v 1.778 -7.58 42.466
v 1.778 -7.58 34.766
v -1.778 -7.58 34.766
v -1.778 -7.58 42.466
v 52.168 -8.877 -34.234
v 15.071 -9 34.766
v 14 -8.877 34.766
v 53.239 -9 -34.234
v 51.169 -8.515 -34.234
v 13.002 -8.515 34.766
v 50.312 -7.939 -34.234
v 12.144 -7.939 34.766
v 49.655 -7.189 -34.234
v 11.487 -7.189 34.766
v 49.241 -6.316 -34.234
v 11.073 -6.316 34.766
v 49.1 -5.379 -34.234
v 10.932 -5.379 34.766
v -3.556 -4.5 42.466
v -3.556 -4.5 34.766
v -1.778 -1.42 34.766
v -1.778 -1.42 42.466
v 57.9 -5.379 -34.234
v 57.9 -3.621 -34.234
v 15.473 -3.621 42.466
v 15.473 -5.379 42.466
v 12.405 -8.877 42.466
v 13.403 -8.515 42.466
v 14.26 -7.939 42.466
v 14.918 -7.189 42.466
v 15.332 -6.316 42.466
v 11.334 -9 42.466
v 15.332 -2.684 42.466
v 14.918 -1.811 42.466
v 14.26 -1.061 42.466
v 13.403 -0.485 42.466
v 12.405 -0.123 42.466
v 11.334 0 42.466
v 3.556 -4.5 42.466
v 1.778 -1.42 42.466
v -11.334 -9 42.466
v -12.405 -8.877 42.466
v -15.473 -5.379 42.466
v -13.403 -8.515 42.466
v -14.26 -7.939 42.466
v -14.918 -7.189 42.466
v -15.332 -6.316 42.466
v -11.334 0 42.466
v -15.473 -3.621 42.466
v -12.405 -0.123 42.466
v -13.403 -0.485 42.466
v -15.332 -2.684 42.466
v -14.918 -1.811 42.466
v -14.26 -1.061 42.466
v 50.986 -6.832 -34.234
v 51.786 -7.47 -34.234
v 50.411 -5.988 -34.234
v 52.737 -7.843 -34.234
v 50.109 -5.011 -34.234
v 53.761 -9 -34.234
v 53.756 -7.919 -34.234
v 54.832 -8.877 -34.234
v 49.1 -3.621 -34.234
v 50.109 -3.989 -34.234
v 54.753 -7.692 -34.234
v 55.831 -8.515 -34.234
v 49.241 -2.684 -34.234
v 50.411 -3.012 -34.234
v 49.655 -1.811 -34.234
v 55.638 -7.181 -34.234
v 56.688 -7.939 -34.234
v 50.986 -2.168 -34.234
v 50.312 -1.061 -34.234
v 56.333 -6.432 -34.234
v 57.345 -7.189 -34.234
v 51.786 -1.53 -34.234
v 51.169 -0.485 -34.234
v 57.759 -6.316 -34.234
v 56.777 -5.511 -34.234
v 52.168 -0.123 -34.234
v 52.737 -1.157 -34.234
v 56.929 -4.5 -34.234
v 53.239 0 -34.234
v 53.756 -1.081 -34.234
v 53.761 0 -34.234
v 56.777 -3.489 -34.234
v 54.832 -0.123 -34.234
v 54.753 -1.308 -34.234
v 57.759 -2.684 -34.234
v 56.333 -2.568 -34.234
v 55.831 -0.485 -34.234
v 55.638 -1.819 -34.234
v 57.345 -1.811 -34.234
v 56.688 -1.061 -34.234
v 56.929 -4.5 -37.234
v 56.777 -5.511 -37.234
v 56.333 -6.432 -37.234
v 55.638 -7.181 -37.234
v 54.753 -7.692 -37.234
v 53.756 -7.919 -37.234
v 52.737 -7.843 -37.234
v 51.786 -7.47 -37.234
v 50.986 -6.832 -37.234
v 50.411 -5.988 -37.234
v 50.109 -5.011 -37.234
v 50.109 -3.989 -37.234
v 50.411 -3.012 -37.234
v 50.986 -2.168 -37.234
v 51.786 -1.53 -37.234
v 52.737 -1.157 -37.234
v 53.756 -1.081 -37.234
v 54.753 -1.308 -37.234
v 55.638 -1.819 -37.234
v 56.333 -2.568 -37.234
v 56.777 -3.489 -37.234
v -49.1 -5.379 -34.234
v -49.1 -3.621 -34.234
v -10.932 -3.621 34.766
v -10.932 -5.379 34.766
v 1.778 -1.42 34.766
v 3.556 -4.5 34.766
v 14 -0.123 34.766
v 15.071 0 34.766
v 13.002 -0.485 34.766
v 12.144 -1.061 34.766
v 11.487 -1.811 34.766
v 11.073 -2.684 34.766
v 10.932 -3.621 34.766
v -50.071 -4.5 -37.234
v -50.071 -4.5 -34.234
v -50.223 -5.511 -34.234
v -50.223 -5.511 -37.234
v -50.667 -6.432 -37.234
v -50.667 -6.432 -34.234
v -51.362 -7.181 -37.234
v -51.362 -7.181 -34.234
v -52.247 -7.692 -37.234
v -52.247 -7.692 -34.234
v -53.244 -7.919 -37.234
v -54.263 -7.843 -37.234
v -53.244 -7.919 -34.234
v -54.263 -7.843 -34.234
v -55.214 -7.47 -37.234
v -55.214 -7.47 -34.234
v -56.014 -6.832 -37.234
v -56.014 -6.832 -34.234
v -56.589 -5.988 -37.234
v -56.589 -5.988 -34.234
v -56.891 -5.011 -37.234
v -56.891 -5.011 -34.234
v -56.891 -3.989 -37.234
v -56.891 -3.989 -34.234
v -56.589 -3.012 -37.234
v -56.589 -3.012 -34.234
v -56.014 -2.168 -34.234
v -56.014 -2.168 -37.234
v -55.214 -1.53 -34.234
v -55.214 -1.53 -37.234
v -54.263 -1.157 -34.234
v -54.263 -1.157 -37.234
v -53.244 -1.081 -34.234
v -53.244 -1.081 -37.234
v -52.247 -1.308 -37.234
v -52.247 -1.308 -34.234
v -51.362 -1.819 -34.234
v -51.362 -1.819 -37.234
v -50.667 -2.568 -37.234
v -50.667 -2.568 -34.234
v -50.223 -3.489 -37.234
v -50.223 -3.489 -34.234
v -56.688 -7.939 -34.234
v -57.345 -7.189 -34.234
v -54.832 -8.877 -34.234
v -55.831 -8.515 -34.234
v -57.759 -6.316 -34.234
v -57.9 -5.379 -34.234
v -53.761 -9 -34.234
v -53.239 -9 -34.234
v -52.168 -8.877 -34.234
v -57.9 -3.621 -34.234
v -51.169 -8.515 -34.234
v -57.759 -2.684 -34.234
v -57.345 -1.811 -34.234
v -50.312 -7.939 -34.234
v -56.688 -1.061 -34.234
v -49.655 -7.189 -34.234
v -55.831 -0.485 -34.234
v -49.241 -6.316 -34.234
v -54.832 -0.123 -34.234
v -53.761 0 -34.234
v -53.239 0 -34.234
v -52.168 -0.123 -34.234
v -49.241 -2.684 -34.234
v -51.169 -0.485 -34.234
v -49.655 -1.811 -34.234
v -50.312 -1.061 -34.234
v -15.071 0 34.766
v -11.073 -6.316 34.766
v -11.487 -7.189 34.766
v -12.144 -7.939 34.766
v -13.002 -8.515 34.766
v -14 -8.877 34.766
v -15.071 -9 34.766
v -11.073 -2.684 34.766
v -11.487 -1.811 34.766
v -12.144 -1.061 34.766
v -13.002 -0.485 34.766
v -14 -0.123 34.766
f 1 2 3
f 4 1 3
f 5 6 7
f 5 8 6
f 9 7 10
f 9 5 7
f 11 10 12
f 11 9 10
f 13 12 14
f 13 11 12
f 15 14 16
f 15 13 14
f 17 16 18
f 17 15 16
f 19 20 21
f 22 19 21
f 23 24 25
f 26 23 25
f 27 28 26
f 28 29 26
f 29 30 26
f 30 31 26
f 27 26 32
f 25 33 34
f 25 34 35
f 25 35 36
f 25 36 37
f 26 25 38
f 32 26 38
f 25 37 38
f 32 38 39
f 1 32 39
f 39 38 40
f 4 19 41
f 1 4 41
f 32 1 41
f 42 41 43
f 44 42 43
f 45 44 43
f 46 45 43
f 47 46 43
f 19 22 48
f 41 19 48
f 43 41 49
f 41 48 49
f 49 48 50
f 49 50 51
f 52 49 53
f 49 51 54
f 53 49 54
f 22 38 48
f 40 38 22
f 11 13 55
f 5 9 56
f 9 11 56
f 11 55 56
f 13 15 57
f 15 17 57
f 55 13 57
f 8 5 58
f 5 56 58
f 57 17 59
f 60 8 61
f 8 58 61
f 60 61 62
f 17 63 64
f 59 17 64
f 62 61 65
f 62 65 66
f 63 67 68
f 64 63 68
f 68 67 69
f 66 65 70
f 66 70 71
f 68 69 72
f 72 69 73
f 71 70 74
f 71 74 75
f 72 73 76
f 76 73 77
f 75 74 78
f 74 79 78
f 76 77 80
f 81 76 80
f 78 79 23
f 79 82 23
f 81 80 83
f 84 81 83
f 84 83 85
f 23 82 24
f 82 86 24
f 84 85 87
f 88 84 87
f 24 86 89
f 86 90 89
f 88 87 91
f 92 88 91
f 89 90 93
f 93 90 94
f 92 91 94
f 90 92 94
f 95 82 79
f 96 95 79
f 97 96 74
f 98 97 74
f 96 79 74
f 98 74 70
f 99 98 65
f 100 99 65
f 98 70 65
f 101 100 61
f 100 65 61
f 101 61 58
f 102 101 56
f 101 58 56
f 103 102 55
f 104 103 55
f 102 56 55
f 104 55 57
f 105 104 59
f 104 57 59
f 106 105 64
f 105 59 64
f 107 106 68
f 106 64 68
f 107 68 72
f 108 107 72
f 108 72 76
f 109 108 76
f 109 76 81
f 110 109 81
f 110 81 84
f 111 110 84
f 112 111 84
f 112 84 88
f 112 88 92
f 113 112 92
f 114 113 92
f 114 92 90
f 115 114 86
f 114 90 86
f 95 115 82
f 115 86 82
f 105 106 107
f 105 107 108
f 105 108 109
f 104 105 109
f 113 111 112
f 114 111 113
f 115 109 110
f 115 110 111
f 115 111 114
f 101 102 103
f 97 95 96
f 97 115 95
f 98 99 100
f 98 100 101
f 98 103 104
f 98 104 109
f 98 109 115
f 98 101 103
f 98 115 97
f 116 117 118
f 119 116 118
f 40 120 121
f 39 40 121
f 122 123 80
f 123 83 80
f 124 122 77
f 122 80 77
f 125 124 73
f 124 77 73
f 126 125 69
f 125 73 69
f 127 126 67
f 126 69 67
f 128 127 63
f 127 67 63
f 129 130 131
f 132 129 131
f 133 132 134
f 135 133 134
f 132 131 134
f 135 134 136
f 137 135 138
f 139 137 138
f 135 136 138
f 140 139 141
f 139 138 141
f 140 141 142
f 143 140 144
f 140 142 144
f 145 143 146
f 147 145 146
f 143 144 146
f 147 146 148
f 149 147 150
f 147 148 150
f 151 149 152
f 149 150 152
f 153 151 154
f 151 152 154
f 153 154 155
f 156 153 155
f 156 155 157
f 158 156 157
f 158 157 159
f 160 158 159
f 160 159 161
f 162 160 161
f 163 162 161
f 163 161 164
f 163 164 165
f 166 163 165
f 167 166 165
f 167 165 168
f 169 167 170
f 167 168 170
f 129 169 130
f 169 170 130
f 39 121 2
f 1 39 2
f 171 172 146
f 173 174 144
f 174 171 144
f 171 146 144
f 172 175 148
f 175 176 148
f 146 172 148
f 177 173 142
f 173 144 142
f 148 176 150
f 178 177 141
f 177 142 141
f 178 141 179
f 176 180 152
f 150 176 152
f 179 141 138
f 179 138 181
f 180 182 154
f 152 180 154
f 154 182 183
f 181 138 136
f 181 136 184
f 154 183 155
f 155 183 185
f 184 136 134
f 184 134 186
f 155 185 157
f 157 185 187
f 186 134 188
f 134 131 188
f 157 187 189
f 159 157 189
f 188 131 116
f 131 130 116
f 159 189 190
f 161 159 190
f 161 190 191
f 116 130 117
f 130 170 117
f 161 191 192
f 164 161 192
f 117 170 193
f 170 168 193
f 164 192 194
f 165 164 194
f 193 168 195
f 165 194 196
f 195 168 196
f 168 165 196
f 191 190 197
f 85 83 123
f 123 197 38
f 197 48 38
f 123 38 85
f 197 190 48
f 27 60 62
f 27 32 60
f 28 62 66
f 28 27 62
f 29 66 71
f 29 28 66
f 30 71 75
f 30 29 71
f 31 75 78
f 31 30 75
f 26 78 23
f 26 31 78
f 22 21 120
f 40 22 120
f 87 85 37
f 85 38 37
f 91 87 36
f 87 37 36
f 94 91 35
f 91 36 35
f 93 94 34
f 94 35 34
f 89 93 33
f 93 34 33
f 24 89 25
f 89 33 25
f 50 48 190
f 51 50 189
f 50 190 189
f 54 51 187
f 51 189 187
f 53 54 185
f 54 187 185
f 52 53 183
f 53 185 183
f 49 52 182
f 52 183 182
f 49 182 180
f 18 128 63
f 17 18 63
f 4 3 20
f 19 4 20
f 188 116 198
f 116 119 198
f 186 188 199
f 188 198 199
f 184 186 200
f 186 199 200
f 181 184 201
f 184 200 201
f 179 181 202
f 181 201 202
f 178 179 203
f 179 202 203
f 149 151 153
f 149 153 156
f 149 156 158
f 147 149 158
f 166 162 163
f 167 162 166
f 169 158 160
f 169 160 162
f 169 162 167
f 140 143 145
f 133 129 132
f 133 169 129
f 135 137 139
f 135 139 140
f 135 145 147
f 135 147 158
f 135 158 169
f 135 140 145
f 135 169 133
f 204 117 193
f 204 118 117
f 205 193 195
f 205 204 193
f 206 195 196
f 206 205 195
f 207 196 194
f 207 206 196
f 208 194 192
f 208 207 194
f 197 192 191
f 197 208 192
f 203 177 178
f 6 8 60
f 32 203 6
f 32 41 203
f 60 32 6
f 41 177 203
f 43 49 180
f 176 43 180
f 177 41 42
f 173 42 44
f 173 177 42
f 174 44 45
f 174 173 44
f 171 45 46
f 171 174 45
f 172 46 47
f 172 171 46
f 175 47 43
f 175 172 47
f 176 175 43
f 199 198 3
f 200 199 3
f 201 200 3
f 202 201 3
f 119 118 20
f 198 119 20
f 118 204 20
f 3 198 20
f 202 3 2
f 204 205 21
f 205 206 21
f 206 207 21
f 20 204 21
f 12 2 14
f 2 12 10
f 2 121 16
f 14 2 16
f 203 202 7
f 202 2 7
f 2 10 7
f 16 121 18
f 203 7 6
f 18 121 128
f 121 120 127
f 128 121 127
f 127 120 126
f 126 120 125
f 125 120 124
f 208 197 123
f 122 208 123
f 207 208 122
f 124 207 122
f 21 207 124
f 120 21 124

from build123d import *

# Parameters (mm, degrees)
F1_DEPTH = 9
F2_R     = 3.429
F3_R     = 3.429
F4_DEPTH = 3
F6_DEPTH = 7.700001
F7_R     = 3.62132


with BuildPart() as f1:
    # F0 (on Front) → F1 (new body)
    with BuildSketch(Plane.XZ):
        Polygon((-10.932353, 34.76619), (0, 34.76619), (10.932353, 34.76619), (49.100234, -34.23381), (57.899766, -34.23381), (15.472571, 42.466191), (0, 42.466191), (-15.472571, 42.466191), (-57.899766, -34.23381), (-49.100234, -34.23381), align=None)
    extrude(amount=F1_DEPTH)

    # F2 (on face) + F3 (on face) → F4 (join)
    with BuildSketch(Plane(origin=(0, 0, -34.23381), x_dir=(1, 0, 0), z_dir=(0, 0, -1))):
        with Locations((-53.5, 4.5)):
            Circle(F2_R)
    with BuildSketch(Plane(origin=(0, 0, -34.23381), x_dir=(1, 0, 0), z_dir=(0, 0, -1))):
        with Locations((53.5, 4.5)):
            Circle(F3_R)
    extrude(amount=F4_DEPTH)

    # F5 (on face) → F6 (cut, through all)
    with BuildSketch(Plane(origin=(0, 0, 34.76619), x_dir=(1, 0, 0), z_dir=(0, 0, -1))):
        Polygon((-1.778, 7.579586), (-3.556, 4.5), (-1.778, 1.420414), (1.778, 1.420414), (3.556, 4.5), (1.778, 7.579586), align=None)
    extrude(amount=-F6_DEPTH, mode=Mode.SUBTRACT)

    # F7
    f7_edges = [f1.edges().sort_by_distance(p)[0] for p in [
        (-36.686169, -9, 4.11619),
        (-36.686169, 0, 4.11619),
        (36.686169, 0, 4.11619),
        (36.686169, -9, 4.11619),
        (-30.016294, -9, 0.26619),
        (-30.016294, 0, 0.26619),
        (30.016294, -9, 0.26619),
        (30.016294, 0, 0.26619),
    ]]
    fillet(f7_edges, radius=F7_R)


solid = f1.part
